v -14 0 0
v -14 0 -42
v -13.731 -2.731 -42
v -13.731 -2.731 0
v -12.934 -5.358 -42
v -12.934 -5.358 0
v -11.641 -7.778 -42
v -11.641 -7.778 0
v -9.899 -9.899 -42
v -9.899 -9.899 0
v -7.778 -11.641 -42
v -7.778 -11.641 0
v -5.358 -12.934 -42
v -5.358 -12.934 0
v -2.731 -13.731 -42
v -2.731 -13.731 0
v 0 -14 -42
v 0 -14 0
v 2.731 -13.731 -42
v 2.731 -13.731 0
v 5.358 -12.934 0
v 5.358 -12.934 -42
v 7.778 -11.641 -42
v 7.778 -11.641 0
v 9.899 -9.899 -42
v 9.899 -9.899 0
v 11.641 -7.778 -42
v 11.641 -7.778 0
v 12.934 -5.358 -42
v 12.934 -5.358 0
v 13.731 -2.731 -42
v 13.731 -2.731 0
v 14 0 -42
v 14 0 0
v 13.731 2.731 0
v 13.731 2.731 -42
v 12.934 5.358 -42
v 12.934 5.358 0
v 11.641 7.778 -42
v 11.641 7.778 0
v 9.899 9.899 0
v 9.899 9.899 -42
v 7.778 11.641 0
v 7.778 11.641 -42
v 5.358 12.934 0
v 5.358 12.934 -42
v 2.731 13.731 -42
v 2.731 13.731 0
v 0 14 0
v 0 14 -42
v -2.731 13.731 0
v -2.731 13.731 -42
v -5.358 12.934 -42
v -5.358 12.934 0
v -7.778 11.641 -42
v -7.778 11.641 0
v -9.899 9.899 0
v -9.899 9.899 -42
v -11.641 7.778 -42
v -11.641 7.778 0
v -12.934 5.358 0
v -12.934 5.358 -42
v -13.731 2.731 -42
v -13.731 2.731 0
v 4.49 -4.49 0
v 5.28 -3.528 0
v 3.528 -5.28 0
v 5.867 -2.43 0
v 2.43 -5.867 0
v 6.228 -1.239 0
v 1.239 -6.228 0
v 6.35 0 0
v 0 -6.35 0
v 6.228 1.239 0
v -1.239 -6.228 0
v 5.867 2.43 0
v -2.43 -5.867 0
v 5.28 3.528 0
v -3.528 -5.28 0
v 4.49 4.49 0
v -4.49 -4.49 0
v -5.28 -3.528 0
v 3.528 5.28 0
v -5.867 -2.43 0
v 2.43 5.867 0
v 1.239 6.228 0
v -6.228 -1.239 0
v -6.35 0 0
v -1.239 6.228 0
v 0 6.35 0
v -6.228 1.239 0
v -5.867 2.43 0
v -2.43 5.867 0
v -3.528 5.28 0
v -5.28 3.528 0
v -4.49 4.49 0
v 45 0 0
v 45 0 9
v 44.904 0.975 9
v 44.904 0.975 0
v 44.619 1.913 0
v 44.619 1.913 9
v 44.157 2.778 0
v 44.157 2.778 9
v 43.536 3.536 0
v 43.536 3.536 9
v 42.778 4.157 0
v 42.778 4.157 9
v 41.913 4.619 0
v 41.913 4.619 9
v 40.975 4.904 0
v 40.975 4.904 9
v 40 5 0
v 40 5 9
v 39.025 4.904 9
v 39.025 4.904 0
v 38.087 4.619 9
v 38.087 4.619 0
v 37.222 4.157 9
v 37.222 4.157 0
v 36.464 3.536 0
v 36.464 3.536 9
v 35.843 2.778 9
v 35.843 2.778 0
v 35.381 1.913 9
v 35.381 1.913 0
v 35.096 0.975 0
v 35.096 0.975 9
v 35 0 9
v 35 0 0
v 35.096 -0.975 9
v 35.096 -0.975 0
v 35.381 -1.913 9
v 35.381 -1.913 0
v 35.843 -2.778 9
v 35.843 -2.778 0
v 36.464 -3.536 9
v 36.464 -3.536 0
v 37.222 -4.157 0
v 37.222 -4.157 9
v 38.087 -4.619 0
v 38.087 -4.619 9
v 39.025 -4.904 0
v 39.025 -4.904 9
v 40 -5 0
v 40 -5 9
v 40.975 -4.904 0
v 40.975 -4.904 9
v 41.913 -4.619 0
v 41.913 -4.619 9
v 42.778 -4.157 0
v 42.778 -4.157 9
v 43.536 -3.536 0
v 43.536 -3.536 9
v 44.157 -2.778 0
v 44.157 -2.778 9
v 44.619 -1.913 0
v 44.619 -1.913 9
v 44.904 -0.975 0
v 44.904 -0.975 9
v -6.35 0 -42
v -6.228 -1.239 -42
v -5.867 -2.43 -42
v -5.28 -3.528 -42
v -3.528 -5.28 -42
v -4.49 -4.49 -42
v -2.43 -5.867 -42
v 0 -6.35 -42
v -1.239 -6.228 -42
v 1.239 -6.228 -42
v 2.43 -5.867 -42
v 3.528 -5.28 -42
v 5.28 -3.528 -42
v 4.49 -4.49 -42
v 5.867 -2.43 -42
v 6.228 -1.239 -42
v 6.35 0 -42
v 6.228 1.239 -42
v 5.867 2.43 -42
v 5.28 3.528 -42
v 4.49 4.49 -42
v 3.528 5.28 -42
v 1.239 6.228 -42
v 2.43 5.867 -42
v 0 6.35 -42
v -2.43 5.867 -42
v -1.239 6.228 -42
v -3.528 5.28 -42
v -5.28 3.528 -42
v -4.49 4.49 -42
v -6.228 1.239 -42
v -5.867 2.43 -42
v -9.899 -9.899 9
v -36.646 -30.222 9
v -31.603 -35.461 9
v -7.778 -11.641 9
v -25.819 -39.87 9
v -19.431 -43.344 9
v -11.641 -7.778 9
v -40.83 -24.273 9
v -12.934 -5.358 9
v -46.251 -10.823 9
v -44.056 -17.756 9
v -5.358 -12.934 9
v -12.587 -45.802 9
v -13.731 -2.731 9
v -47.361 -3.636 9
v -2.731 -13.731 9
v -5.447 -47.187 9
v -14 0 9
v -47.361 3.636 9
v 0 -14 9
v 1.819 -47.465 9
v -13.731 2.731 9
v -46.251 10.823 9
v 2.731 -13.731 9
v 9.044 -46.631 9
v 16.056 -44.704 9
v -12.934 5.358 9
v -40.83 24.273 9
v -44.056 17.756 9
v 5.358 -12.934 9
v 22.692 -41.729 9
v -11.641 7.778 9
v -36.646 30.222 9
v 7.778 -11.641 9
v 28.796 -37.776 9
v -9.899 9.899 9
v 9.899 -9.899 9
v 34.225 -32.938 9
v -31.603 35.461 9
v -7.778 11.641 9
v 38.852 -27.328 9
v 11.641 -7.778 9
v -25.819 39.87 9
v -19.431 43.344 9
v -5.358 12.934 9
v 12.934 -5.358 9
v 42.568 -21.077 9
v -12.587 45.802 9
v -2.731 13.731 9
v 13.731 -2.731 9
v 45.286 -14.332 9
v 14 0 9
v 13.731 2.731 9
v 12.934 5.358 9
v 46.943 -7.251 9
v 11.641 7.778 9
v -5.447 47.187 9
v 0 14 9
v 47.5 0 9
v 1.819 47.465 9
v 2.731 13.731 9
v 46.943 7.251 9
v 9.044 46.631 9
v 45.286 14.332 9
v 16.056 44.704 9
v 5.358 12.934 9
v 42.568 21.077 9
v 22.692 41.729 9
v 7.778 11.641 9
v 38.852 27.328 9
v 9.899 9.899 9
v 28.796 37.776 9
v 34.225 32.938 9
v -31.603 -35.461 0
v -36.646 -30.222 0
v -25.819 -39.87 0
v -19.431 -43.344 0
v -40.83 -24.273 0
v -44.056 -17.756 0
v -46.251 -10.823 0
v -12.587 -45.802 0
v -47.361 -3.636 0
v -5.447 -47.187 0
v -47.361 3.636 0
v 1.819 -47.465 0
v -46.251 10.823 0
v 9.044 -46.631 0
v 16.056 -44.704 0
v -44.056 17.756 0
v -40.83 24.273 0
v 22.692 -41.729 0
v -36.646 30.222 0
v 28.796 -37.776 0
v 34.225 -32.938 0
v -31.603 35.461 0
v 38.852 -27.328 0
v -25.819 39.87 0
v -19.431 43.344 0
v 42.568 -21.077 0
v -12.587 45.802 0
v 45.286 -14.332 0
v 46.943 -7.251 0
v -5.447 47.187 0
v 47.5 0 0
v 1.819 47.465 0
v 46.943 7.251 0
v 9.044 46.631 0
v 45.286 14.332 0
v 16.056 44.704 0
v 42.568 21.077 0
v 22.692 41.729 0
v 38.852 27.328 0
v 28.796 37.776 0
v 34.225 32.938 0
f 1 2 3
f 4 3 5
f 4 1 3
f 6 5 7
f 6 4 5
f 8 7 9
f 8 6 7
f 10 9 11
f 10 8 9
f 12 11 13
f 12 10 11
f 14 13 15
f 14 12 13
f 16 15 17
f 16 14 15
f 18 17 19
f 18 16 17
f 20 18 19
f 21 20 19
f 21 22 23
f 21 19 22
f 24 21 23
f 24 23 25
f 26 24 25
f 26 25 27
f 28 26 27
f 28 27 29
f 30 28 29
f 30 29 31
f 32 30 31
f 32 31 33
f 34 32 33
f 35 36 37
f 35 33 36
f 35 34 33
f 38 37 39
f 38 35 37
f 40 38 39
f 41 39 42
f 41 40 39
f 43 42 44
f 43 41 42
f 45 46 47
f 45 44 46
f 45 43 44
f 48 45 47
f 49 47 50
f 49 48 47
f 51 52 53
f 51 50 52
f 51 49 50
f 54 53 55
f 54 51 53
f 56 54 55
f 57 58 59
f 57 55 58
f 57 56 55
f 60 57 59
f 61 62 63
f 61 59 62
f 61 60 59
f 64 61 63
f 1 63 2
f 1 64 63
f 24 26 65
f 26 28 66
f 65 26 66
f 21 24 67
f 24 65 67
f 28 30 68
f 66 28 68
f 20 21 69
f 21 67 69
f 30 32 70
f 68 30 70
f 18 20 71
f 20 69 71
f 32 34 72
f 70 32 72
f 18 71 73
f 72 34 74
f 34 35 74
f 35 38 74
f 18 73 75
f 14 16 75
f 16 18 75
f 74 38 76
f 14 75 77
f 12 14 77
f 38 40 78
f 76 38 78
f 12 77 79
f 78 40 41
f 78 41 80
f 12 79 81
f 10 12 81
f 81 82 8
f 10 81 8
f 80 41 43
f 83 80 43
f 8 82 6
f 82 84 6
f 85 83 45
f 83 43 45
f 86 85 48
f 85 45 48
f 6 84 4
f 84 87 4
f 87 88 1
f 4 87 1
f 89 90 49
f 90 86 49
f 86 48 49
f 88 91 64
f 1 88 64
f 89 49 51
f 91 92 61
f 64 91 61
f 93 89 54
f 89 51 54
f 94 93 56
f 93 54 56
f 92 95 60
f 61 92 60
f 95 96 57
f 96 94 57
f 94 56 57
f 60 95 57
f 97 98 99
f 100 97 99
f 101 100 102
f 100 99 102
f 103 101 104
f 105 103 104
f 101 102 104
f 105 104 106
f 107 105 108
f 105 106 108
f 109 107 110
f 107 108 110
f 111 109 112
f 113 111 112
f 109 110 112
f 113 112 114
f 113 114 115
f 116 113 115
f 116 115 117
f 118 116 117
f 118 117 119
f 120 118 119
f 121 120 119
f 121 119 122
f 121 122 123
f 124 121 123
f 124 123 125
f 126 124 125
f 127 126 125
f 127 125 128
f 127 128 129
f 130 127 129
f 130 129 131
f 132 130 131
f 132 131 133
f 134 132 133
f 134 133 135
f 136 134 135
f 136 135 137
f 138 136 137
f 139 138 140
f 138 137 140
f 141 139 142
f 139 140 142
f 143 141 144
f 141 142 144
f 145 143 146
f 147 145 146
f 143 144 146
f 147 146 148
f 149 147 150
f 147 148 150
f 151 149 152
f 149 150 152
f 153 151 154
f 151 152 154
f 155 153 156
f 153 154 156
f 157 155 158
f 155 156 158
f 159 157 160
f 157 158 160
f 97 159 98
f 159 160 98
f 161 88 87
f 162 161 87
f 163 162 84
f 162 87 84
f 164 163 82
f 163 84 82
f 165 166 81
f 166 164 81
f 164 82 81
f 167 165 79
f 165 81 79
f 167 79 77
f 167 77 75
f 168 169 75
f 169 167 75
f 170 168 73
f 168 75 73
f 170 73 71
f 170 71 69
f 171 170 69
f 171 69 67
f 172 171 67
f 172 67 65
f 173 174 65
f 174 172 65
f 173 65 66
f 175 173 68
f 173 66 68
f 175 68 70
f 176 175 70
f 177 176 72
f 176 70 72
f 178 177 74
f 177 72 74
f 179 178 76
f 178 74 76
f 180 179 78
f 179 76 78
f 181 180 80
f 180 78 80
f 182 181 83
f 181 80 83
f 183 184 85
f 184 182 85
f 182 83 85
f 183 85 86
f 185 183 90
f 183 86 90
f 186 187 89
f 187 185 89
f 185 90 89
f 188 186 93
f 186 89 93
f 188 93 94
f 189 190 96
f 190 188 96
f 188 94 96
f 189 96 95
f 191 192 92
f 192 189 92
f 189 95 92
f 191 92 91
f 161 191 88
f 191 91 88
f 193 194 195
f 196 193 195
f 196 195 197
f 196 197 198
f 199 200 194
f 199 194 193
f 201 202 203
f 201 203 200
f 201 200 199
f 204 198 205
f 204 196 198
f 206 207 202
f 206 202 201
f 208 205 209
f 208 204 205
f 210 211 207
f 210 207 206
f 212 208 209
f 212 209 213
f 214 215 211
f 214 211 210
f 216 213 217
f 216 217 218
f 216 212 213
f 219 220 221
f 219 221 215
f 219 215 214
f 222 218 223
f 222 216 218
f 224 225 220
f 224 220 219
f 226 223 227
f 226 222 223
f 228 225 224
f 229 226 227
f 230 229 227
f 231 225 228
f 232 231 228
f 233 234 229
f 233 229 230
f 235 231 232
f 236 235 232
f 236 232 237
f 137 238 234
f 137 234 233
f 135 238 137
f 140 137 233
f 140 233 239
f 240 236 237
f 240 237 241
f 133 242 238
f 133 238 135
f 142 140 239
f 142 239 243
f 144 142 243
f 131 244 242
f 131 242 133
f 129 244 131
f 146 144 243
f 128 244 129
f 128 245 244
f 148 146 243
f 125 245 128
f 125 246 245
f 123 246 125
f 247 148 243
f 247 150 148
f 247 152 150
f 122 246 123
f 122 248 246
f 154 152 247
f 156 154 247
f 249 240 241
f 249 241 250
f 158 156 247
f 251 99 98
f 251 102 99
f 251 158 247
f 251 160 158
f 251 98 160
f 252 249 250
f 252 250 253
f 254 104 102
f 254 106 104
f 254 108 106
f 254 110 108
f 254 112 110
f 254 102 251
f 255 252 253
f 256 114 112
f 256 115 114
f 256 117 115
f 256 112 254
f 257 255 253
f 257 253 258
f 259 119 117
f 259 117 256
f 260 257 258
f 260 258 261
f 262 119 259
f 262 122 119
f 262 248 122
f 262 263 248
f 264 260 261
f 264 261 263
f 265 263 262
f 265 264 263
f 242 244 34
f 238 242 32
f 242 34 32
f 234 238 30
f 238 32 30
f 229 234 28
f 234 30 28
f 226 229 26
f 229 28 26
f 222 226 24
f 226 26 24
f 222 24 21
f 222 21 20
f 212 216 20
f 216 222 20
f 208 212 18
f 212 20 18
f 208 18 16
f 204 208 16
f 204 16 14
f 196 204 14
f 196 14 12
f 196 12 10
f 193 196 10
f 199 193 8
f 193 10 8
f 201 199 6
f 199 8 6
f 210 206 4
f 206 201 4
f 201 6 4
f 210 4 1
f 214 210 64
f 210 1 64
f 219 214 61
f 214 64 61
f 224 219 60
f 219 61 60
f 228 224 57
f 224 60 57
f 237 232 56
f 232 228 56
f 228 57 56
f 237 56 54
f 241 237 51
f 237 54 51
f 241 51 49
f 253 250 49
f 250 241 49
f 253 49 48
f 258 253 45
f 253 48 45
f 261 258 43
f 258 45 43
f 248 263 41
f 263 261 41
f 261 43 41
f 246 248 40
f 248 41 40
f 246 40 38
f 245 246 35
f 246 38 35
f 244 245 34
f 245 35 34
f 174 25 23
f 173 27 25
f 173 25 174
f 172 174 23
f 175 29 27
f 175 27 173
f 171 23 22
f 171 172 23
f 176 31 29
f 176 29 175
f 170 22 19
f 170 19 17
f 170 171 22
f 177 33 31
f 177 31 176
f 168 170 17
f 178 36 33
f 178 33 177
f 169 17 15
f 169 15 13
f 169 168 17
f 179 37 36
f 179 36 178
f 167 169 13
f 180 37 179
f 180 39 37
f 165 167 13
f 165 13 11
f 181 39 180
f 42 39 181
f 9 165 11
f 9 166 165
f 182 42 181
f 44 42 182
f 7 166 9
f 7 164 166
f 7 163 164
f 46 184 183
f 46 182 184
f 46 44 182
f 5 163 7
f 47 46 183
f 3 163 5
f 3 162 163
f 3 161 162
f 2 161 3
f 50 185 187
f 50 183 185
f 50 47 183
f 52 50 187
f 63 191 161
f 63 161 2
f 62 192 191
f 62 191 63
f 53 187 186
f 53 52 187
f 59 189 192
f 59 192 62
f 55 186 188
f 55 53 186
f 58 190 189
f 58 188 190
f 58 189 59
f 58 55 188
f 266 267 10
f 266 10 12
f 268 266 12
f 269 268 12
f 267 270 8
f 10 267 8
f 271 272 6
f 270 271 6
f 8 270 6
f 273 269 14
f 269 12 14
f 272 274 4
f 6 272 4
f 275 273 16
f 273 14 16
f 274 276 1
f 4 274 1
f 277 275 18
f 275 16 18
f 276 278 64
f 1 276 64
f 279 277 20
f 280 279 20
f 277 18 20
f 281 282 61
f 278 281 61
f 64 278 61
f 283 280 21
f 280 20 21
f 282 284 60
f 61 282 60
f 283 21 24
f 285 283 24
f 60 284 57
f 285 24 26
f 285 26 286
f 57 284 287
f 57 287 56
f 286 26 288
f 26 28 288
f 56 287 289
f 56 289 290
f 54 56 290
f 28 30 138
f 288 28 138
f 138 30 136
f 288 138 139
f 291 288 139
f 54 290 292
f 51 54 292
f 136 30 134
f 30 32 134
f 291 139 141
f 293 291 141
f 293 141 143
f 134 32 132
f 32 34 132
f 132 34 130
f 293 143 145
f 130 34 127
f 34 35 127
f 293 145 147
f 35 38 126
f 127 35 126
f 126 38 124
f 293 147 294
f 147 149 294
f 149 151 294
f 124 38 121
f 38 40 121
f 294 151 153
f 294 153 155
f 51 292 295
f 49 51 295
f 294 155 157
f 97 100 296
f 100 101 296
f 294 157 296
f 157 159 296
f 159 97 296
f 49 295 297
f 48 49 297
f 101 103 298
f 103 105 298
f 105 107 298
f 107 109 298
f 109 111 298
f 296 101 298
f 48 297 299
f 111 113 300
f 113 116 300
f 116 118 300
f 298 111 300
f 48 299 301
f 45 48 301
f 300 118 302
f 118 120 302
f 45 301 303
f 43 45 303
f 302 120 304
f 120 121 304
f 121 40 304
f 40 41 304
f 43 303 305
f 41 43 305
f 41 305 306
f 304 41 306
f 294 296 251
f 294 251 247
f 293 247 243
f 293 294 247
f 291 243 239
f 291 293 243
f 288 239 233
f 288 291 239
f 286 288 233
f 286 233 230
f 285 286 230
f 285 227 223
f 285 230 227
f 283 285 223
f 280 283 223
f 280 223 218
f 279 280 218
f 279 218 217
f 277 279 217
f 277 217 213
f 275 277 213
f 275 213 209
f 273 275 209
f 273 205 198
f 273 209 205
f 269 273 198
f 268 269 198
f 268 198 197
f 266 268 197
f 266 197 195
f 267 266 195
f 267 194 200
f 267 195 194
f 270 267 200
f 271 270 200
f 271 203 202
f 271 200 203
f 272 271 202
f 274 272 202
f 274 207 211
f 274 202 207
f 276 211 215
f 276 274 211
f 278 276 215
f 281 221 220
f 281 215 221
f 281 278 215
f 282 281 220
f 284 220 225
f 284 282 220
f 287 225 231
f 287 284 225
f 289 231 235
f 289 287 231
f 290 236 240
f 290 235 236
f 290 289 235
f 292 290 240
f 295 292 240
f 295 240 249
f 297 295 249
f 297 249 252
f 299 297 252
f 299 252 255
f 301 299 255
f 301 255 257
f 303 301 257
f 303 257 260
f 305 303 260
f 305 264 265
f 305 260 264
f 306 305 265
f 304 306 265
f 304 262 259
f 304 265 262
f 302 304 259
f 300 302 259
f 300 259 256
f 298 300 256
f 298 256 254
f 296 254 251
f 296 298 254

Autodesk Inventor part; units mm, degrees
ref_plane "YZ Plane" through (0, 0, 0) normal (1, 0, 0) x (0, 1, 0)
ref_plane "XZ Plane" through (0, 0, 0) normal (0, 1, 0) x (-1, 0, 0)
ref_plane "XY Plane" through (0, 0, 0) normal (0, 0, 1) x (1, 0, 0)
sketch "Sketch1" plane through (0, 0, 0) normal (0, 0, 1) x (1, 0, 0)
  circle A0 centre (0, 0) radius 6.35
  circle A1 centre (0, 0) radius 14
  circle A2 centre (0, 0) radius 47.5
  dimension "d0" = 12.7
  dimension "d1" = 28
  dimension "d2" = 95
extrude "Extrusion1" add sketch "Sketch1" along normal blind 9 contours A2
sketch "Sketch2" plane through (0, 0, 0) normal (0, 0, -1) x (-1, 0, 0)
  circle A0 centre (0, 0) radius 14
  circle A1 centre (0, 0) radius 6.35
  dimension "d5" = 28
  dimension "d6" = 12.7
extrude "Extrusion2" add sketch "Sketch2" along normal blind 42
sketch "Sketch3" plane through (0, 0, 0) normal (0, 0, -1) x (-1, 0, 0)
  circle A0 centre (0, 0) radius 35
  arc A1 (34.8714, -2.9972) -> (34.8714, 2.9972) centre (35, 0) ccw
  circle A2 centre (35, 0) radius 5
  dimension "d9" = 70
  dimension "d10" = 6
  dimension "d11" = 10
extrude "Extrusion3" cut sketch "Sketch3" along normal blind 9 contours A0 A2 | A0 A1 | A0 A2 A1 picked at (31.7184, 0.4122)
sketch "Sketch4" plane through (-35, 0, -9) normal (0, 0, -1) x (-1, 0, 0)
  point P0 (-35, 0)
sketch "Sketch5" plane through (0, 0, 9) normal (0, 0, 1) x (1, 0, 0)
  circle A0 centre (0, 0) radius 40
  circle A1 centre (40, 0) radius 3.5
  dimension "d14" = 80
  dimension "d15" = 7
extrude "Extrusion4" cut sketch "Sketch5" against normal blind 9 contours A0 A1 | A0 A1 picked at (38.8994, -0.7916) picked at (41.039, -0.9083)
sketch "Sketch6" plane through (0, 0, 9) normal (0, 0, 1) x (1, 0, 0)
  circle A0 centre (40, 0) radius 3.5 projected
  circle A1 centre (40, 0) radius 5
  point P0 (0, 0)
  dimension "d18" = 10
extrude "Extrusion5" cut sketch "Sketch6" against normal blind 9 contours A0 | A1
properties part number "TA 212 project part(DISK)"
